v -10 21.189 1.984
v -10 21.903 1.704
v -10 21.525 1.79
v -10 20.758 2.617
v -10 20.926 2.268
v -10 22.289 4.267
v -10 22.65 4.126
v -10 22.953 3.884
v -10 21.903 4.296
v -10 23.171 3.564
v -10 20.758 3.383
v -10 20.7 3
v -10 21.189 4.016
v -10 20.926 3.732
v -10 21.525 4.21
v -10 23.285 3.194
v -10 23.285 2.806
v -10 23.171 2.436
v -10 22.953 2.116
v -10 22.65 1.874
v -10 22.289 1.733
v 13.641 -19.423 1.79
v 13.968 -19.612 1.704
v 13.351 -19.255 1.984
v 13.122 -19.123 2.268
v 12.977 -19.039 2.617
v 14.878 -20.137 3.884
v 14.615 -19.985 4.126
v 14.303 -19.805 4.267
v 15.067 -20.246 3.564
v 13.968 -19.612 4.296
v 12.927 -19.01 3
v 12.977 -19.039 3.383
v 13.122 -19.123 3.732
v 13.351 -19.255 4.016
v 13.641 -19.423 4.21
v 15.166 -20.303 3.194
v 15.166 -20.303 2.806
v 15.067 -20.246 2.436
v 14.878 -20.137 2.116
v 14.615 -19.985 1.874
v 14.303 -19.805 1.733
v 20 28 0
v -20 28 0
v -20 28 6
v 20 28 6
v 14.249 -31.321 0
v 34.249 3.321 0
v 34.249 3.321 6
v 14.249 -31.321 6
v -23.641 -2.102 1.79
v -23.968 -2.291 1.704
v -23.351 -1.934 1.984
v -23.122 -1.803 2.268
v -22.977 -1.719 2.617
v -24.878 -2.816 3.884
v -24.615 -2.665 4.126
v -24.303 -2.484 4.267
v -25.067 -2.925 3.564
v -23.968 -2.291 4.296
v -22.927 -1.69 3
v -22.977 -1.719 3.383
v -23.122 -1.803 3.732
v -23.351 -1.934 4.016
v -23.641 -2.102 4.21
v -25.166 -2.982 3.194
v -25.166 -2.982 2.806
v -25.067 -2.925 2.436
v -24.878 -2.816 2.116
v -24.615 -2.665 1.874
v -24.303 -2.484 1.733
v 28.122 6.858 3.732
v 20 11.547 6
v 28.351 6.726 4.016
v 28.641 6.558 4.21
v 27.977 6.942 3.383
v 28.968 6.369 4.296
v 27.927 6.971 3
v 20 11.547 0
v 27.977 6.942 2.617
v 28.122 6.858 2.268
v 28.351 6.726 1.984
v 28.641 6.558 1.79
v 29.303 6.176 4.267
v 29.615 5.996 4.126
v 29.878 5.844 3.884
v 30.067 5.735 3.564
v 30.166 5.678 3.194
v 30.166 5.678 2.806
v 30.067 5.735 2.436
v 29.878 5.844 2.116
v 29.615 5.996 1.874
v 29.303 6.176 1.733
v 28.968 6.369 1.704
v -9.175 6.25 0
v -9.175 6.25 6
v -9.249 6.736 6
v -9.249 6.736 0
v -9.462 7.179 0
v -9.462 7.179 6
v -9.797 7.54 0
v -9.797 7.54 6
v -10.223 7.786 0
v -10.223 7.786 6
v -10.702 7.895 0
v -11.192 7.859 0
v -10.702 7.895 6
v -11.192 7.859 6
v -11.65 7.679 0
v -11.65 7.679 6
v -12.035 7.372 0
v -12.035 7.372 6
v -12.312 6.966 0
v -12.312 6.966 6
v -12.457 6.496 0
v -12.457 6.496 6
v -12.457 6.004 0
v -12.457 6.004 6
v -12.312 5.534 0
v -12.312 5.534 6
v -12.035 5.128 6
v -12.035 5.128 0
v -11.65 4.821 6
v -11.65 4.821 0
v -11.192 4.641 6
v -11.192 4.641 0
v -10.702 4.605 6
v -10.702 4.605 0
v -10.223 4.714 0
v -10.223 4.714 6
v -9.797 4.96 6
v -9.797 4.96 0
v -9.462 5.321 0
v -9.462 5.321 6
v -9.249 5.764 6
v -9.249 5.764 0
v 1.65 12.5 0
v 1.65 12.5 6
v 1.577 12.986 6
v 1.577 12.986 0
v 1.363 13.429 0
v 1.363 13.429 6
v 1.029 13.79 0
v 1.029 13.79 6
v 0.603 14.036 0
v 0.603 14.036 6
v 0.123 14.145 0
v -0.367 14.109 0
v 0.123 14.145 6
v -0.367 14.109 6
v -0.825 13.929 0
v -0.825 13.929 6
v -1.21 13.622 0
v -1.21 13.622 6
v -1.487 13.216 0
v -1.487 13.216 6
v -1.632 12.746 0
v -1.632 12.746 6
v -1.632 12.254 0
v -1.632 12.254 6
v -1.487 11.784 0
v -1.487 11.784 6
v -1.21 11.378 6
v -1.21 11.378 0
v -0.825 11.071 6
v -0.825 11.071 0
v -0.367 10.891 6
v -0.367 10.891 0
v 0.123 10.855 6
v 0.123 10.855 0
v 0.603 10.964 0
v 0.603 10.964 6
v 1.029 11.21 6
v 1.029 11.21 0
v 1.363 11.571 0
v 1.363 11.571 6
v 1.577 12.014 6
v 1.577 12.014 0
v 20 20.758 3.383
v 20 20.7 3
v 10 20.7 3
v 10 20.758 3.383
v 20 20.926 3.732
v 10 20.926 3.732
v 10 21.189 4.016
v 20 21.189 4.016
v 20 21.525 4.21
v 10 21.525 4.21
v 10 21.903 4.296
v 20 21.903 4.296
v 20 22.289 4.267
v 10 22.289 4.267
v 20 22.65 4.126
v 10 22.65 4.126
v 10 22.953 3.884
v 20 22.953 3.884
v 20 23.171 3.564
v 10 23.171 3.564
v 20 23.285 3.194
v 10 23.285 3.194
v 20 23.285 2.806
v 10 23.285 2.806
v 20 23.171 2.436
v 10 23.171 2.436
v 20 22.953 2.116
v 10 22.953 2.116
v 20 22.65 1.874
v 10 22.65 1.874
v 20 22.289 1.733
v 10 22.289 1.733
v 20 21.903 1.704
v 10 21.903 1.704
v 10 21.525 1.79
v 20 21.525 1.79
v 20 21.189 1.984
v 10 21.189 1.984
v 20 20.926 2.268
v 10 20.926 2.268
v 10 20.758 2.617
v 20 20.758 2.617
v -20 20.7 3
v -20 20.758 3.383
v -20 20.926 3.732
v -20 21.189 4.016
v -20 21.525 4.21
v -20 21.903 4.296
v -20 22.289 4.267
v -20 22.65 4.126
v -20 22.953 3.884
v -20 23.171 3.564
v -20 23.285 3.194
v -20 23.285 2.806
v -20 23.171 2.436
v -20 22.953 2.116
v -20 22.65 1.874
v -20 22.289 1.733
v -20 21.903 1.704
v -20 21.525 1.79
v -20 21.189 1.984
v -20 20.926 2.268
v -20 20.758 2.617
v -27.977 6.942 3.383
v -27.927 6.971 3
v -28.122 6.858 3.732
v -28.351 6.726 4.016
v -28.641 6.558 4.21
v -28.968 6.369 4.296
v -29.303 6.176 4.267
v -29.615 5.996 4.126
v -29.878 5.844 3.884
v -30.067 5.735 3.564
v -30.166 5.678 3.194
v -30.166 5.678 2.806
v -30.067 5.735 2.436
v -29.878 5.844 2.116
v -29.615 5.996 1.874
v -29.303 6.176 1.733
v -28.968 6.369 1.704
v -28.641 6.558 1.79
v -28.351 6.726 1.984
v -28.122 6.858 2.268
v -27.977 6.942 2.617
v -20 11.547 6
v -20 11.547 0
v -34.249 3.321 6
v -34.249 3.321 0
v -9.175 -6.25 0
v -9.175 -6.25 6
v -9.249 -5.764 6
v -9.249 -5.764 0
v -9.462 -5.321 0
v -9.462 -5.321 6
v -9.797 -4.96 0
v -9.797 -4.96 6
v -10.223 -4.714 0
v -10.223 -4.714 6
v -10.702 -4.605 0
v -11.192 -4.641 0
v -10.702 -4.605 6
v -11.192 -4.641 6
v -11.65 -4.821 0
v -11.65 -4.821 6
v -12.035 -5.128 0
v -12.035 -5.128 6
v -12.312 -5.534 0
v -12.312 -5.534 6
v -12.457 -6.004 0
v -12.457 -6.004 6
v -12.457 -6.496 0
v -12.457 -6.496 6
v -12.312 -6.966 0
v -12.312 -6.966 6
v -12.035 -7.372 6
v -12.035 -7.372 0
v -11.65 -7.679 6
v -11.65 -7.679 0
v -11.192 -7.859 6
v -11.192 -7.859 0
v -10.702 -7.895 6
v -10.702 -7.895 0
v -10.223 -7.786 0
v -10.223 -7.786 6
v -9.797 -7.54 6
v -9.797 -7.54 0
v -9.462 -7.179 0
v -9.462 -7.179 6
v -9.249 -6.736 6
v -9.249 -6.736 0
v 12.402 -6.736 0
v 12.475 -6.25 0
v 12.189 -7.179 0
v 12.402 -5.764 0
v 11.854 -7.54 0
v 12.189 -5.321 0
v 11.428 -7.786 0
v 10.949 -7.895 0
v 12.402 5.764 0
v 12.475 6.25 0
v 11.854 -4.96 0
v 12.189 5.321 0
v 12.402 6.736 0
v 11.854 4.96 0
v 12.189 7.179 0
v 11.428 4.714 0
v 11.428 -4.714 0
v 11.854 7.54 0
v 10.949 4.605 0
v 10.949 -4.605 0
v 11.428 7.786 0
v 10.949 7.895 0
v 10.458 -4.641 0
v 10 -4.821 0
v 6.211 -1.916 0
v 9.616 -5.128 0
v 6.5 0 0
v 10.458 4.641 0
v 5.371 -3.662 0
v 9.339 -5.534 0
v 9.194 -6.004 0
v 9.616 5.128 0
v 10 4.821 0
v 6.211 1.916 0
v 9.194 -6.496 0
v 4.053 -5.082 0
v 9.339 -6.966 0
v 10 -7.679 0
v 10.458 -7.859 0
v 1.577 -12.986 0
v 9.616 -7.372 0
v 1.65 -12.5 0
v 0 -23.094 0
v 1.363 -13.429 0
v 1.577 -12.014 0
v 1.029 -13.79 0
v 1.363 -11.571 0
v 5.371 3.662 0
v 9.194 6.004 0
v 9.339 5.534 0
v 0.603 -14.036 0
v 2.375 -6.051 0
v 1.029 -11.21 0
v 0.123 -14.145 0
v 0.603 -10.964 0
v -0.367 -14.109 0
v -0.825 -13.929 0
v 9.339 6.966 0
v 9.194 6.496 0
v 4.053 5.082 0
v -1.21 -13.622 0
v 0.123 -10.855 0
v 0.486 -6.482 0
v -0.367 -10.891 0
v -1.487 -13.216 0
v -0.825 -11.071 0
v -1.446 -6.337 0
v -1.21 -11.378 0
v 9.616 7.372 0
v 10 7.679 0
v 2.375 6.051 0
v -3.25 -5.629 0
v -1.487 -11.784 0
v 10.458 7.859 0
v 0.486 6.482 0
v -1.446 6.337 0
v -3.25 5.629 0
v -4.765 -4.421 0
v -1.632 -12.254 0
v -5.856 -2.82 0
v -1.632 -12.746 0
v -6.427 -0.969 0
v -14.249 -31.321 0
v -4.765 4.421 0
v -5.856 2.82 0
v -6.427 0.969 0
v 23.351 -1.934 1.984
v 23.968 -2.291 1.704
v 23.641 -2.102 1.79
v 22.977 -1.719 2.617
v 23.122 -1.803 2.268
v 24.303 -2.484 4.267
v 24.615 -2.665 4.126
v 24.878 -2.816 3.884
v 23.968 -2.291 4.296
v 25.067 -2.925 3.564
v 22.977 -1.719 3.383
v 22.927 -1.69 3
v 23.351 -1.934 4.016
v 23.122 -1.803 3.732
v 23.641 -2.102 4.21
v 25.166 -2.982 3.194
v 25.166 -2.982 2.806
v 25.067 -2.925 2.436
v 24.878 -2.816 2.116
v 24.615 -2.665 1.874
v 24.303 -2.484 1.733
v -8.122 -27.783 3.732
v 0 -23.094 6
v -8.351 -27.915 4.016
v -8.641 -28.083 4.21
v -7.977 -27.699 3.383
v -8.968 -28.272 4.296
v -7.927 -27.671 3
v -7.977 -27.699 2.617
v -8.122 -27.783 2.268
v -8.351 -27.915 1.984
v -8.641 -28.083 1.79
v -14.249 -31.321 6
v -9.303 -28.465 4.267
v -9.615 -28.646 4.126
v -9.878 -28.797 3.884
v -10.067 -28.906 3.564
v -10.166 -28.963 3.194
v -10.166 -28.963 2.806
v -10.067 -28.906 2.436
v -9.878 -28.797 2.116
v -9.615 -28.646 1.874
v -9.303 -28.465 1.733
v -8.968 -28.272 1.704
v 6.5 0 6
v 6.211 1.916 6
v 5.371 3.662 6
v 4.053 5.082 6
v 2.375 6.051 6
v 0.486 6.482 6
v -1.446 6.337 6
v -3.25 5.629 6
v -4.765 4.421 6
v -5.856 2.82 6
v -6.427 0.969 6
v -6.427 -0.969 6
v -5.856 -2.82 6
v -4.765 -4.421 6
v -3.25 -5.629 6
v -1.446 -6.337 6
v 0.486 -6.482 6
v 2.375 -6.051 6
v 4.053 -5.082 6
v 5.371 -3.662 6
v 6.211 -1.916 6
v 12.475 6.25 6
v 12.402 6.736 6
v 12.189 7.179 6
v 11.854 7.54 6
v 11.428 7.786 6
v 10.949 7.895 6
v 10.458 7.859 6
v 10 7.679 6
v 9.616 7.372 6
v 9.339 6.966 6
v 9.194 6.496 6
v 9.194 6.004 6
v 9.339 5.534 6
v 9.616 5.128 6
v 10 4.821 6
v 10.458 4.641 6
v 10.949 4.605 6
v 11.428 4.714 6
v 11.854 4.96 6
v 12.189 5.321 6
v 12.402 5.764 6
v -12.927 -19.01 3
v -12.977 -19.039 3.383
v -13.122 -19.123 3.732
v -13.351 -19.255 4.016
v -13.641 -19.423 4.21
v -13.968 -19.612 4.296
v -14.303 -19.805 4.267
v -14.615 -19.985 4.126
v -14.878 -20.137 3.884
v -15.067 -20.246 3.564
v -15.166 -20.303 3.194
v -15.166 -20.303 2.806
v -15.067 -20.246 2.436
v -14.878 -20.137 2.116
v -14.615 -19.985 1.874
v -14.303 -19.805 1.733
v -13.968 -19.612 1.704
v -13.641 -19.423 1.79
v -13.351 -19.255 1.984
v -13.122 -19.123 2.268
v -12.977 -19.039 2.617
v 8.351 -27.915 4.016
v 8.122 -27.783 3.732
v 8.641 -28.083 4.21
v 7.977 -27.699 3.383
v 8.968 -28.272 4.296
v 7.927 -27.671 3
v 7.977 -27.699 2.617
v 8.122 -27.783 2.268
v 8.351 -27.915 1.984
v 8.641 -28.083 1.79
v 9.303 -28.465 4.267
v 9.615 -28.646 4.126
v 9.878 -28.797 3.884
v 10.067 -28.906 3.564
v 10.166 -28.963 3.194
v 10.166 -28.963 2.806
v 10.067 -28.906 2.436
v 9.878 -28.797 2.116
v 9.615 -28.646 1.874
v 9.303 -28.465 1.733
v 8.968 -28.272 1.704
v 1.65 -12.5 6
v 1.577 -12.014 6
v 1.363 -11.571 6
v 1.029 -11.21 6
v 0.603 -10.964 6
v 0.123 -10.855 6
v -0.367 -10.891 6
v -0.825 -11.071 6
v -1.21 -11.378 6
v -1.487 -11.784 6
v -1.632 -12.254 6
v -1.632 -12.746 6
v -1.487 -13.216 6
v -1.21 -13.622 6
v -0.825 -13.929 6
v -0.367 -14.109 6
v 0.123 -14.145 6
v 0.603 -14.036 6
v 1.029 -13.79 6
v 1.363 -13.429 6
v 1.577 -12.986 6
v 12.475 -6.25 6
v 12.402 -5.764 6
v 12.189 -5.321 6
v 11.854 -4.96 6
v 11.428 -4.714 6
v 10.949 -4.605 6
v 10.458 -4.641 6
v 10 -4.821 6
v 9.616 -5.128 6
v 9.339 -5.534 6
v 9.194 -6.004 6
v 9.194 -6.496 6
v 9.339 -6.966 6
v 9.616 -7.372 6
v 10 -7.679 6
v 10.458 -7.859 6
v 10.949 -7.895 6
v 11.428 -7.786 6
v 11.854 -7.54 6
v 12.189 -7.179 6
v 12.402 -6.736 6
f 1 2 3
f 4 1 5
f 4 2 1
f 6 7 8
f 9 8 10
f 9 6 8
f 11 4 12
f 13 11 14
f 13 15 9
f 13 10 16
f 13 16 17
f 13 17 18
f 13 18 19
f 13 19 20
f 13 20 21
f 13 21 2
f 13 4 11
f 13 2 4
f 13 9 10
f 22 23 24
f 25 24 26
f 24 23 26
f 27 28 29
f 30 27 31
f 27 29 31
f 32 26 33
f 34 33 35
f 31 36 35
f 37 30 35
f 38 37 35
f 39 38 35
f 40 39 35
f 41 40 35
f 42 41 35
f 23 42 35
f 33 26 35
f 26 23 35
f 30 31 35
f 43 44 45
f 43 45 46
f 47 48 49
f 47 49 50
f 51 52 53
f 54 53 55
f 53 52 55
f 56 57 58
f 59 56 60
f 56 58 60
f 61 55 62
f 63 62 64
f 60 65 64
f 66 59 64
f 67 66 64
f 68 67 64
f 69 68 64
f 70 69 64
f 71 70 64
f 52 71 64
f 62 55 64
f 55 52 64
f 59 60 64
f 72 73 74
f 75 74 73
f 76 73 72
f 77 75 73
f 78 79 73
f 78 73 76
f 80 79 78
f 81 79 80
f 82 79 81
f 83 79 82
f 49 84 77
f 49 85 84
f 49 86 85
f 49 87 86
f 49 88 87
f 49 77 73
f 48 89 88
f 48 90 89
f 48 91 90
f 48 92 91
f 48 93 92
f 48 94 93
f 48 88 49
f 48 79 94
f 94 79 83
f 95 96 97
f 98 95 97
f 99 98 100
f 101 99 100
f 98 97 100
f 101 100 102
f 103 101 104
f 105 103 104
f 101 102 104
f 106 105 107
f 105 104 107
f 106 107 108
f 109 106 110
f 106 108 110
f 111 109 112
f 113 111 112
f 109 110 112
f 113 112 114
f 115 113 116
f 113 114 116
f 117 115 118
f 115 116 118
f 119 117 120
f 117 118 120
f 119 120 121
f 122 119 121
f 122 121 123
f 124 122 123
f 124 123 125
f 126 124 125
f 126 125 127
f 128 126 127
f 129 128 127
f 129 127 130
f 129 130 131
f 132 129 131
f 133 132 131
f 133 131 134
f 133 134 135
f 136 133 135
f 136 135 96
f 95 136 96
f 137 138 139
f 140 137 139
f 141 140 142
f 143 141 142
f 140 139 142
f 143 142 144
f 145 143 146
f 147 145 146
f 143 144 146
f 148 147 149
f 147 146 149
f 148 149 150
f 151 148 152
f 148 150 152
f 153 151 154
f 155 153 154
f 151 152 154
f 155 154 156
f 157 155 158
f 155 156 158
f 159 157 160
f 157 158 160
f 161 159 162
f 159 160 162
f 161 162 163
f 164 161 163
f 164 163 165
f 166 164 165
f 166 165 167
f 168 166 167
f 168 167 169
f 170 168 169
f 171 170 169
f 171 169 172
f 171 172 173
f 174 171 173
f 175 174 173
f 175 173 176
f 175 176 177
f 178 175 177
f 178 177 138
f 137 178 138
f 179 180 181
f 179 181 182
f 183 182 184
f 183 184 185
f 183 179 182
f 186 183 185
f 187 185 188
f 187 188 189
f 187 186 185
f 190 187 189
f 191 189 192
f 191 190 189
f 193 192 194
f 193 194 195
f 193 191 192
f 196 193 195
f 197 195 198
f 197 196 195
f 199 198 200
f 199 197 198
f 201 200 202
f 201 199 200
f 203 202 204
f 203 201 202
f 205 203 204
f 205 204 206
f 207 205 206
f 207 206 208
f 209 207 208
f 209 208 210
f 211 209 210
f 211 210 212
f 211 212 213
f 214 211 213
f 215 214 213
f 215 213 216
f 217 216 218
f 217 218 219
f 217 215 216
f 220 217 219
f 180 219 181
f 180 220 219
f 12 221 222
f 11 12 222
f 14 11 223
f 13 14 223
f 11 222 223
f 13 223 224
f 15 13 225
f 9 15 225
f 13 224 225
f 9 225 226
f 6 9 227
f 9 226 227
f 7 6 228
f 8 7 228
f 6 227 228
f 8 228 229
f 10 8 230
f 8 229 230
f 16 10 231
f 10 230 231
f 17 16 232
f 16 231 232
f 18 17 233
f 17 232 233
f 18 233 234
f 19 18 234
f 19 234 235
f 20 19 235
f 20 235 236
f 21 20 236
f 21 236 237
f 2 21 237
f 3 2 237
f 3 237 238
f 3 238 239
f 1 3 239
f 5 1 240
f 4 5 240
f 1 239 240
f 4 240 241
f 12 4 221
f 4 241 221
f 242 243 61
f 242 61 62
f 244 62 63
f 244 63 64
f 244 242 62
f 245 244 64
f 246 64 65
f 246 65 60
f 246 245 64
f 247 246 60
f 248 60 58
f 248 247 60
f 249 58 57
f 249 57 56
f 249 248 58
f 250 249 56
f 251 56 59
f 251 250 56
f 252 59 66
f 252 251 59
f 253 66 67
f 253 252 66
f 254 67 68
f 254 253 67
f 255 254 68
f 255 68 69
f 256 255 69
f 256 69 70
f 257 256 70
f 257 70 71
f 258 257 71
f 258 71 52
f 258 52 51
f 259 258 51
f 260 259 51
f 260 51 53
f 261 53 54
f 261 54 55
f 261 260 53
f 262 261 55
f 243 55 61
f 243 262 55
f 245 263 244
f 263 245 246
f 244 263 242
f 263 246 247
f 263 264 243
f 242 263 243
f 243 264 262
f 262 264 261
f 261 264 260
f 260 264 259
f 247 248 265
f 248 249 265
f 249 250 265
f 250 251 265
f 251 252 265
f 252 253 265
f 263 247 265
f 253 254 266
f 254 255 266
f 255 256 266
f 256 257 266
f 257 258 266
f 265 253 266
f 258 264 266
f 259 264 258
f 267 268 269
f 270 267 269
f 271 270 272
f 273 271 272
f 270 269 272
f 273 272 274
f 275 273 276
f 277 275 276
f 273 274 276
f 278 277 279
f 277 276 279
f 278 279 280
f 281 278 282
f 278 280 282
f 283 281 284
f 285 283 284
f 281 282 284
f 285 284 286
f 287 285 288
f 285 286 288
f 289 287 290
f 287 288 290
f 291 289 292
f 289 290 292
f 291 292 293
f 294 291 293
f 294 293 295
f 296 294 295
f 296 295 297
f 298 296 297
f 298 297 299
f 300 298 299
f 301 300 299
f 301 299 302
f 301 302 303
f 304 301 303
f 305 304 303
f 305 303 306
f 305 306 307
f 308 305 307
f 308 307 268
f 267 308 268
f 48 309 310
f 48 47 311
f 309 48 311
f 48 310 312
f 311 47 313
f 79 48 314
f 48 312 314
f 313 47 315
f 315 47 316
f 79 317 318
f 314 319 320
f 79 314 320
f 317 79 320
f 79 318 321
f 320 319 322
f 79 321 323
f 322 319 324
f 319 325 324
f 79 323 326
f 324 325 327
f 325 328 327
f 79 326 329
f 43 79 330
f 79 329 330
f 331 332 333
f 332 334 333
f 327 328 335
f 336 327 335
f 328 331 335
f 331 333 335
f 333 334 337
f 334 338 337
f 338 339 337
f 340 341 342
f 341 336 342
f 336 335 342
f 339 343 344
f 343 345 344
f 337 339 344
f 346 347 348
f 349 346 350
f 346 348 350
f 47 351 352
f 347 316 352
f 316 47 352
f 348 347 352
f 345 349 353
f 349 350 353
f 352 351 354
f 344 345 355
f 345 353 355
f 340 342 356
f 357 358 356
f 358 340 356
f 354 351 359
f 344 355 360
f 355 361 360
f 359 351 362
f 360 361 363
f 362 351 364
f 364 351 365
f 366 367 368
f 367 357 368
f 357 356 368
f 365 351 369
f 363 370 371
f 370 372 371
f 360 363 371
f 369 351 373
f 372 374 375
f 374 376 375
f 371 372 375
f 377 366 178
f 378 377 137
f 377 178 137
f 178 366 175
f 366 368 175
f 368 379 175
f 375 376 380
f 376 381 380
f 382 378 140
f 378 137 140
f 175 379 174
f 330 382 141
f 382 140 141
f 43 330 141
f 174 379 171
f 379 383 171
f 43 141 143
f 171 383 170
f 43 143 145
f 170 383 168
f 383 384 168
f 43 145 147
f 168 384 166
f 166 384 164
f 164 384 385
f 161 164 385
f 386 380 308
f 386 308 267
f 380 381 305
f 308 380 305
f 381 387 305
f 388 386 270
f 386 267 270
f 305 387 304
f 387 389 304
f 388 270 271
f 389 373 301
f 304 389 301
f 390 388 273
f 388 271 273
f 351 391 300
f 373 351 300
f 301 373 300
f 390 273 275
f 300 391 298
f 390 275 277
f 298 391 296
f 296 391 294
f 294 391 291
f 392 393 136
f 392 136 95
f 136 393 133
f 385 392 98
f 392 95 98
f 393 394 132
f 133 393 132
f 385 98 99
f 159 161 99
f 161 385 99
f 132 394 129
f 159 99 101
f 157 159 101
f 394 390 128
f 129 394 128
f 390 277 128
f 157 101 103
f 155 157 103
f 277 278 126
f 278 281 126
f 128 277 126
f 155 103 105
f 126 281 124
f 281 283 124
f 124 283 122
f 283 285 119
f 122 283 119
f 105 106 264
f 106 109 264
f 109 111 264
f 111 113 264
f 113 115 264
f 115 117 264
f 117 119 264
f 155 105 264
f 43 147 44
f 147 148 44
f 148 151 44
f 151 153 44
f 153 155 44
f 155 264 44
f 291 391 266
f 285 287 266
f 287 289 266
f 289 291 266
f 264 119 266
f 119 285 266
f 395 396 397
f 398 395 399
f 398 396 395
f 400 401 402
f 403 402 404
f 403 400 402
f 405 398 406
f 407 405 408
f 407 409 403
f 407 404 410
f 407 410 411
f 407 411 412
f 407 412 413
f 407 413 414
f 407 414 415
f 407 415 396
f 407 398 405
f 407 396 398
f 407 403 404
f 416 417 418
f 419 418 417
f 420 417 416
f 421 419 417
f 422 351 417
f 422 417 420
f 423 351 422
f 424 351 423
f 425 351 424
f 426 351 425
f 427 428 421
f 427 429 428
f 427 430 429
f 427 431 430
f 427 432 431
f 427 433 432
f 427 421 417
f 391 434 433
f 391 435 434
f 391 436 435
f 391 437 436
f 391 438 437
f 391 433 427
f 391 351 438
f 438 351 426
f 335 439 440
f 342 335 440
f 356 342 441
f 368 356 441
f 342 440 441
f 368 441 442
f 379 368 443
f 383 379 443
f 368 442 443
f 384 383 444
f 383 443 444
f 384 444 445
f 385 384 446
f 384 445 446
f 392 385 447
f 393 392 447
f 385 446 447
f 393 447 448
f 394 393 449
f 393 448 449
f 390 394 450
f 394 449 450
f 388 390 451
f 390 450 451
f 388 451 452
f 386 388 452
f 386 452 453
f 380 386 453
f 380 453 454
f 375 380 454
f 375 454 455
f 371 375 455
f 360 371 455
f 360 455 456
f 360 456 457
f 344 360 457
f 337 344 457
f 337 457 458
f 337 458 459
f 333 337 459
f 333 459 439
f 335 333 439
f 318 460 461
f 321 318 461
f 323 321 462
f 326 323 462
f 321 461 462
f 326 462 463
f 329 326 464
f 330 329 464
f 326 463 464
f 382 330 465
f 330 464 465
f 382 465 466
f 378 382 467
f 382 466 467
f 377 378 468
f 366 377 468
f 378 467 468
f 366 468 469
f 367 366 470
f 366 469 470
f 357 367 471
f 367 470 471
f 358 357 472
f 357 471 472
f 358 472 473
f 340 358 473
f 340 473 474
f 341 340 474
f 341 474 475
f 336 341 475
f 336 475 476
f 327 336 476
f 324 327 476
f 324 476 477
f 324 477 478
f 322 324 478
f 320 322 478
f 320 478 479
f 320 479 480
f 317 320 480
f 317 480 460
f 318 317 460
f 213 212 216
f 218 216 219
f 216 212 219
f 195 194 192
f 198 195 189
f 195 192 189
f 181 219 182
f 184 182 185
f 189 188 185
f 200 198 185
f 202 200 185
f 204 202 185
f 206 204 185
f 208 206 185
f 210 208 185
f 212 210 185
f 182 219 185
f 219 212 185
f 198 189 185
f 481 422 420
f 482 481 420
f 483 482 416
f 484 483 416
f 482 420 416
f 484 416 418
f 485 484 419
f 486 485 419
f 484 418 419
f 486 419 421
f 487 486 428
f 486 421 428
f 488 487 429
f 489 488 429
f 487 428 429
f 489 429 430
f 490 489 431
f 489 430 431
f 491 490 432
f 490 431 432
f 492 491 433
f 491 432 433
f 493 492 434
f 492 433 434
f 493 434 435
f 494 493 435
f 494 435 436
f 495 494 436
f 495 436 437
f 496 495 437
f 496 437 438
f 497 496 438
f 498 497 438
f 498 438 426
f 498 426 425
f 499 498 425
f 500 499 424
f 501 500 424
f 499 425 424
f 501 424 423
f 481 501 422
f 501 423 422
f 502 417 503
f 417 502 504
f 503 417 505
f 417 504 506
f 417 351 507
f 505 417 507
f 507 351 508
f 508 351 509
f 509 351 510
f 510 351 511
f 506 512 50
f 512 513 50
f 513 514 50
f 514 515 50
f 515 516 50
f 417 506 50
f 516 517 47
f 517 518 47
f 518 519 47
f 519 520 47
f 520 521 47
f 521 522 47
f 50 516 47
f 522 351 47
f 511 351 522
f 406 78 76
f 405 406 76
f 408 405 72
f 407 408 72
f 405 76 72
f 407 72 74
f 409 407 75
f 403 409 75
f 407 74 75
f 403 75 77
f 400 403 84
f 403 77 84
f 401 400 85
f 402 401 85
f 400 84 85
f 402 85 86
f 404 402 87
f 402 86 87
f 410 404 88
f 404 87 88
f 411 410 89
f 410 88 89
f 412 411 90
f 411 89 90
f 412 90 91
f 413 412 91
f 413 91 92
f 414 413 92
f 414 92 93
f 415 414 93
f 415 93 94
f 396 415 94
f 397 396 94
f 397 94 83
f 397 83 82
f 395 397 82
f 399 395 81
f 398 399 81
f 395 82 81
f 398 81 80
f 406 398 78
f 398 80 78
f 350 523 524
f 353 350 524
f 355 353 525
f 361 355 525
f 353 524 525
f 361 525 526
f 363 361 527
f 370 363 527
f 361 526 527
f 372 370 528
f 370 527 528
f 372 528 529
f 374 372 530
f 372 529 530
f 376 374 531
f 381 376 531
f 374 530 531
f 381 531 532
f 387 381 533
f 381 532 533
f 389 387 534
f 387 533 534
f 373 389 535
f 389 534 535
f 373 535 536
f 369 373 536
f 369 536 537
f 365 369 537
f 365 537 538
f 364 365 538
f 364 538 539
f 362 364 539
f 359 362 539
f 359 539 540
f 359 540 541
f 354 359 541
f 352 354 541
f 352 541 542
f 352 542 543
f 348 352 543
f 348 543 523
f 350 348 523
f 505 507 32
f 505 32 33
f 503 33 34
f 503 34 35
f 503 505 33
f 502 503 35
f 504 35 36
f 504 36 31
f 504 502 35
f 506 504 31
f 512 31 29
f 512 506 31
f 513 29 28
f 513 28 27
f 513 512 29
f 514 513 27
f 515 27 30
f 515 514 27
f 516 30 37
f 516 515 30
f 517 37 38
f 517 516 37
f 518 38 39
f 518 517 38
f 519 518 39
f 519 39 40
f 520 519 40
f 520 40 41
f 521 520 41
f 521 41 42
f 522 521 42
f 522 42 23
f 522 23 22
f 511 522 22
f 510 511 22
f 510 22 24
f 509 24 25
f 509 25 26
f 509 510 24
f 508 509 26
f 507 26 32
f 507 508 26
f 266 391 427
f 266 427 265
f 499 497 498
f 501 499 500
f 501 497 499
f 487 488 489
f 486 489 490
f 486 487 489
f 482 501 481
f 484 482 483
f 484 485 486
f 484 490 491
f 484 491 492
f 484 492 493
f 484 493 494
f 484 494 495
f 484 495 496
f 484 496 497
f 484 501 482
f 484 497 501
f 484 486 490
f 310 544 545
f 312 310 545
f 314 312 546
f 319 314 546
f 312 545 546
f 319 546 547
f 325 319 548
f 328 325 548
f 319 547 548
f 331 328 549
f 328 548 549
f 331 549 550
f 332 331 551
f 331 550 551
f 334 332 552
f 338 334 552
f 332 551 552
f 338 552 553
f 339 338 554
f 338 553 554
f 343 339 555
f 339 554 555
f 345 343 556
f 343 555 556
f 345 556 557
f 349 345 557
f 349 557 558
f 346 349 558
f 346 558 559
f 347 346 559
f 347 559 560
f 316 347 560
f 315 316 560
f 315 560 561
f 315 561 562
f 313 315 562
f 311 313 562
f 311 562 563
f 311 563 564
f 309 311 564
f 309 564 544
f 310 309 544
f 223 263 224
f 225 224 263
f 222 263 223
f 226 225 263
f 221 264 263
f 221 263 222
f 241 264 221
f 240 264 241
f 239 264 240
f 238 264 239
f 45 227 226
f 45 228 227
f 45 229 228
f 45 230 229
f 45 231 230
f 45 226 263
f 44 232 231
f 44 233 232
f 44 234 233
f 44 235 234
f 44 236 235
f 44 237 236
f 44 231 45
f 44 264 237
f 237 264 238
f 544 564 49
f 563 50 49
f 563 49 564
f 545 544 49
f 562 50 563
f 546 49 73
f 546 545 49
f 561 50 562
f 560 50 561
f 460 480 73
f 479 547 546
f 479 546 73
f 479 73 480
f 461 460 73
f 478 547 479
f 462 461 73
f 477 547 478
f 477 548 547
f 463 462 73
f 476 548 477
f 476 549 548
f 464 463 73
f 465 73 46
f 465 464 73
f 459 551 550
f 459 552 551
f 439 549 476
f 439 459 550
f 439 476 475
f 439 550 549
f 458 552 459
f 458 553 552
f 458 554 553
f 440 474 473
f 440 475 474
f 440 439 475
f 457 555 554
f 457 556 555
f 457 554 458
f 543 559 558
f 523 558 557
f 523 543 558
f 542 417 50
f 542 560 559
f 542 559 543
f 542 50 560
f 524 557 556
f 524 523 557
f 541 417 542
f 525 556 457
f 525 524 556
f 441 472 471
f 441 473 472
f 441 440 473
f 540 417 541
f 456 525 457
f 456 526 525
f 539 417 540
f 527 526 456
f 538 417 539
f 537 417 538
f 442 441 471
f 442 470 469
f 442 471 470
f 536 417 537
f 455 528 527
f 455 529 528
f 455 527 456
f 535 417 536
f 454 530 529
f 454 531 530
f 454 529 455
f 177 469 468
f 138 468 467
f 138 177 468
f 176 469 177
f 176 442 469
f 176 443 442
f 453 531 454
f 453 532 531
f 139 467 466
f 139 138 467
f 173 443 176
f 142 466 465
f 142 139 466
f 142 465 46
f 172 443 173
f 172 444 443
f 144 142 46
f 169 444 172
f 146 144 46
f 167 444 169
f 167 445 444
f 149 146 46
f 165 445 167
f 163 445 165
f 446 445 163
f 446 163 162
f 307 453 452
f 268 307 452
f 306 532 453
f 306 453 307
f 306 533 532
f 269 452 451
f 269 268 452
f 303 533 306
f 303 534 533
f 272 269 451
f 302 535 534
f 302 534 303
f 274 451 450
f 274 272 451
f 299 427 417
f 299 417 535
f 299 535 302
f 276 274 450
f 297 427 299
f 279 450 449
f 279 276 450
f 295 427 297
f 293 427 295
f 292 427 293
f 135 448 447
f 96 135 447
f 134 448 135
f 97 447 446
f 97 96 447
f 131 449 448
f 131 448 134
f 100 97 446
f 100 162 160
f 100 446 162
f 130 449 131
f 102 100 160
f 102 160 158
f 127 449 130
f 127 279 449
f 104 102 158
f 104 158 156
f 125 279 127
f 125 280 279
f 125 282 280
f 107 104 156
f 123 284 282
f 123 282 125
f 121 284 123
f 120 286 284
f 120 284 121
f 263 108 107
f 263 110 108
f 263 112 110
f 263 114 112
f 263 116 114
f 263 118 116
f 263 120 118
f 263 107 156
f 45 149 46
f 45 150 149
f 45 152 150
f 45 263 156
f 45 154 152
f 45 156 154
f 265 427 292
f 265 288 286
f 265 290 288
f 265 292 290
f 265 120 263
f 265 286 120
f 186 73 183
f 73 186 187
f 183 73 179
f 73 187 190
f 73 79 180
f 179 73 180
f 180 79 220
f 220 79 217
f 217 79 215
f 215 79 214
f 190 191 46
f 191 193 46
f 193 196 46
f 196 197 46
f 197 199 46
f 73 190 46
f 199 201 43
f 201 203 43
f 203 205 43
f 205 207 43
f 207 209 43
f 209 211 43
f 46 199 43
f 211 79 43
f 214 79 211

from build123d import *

# Parameters (mm, degrees)
F0_W     = 40
F0_H     = 28
F1_DEPTH = 6
F2_R     = 1.3
F3_DEPTH = 10
F6_COUNT = 3
F7_R     = 6.5
F7_R_2   = 1.65
F8_DEPTH = 6.001


with BuildPart() as f1:
    # F0 (on Top) → F1 (new body)
    with BuildSketch(Plane.XY):
        with Locations((0, 14)):
            Rectangle(F0_W, F0_H)
    extrude(amount=F1_DEPTH)

    # F2 (on face) → F3 (cut)
    with BuildSketch(Plane(origin=(-20, 0, 0), x_dir=(0, -1, 0), z_dir=(-1, 0, 0))):
        with Locations((-22, 3)):
            Circle(F2_R)
    extrude(amount=-F3_DEPTH, mode=Mode.SUBTRACT)

    # F4: F1 across plane


with BuildPart() as f1_1:
    add(f1.part)
    add(f1.part.mirror(Plane.YZ), mode=Mode.INTERSECT)

    # F6: F1 ×3 about axis
    f6_axis = Axis((0, 0, 8.396655), (0, 0, 1))


with BuildPart() as f1_2:
    add(f1_1.part)
    for i in range(1, F6_COUNT):
        add(f1_1.part.rotate(f6_axis, i * 360 / F6_COUNT))

    # F7 (on face) → F8 (cut, through all)
    with BuildSketch(Plane.XY.offset(6)):
        Circle(F7_R)
        with Locations((0, 12.5)):
            Circle(F7_R_2)
        with Locations((10.825318, 6.25)):
            Circle(F7_R_2)
        with Locations((10.825318, -6.25)):
            Circle(F7_R_2)
        with Locations((0, -12.5)):
            Circle(F7_R_2)
        with Locations((-10.825318, 6.25)):
            Circle(F7_R_2)
        with Locations((-10.825318, -6.25)):
            Circle(F7_R_2)
    extrude(amount=-F8_DEPTH, mode=Mode.SUBTRACT)


solid = f1_2.part
